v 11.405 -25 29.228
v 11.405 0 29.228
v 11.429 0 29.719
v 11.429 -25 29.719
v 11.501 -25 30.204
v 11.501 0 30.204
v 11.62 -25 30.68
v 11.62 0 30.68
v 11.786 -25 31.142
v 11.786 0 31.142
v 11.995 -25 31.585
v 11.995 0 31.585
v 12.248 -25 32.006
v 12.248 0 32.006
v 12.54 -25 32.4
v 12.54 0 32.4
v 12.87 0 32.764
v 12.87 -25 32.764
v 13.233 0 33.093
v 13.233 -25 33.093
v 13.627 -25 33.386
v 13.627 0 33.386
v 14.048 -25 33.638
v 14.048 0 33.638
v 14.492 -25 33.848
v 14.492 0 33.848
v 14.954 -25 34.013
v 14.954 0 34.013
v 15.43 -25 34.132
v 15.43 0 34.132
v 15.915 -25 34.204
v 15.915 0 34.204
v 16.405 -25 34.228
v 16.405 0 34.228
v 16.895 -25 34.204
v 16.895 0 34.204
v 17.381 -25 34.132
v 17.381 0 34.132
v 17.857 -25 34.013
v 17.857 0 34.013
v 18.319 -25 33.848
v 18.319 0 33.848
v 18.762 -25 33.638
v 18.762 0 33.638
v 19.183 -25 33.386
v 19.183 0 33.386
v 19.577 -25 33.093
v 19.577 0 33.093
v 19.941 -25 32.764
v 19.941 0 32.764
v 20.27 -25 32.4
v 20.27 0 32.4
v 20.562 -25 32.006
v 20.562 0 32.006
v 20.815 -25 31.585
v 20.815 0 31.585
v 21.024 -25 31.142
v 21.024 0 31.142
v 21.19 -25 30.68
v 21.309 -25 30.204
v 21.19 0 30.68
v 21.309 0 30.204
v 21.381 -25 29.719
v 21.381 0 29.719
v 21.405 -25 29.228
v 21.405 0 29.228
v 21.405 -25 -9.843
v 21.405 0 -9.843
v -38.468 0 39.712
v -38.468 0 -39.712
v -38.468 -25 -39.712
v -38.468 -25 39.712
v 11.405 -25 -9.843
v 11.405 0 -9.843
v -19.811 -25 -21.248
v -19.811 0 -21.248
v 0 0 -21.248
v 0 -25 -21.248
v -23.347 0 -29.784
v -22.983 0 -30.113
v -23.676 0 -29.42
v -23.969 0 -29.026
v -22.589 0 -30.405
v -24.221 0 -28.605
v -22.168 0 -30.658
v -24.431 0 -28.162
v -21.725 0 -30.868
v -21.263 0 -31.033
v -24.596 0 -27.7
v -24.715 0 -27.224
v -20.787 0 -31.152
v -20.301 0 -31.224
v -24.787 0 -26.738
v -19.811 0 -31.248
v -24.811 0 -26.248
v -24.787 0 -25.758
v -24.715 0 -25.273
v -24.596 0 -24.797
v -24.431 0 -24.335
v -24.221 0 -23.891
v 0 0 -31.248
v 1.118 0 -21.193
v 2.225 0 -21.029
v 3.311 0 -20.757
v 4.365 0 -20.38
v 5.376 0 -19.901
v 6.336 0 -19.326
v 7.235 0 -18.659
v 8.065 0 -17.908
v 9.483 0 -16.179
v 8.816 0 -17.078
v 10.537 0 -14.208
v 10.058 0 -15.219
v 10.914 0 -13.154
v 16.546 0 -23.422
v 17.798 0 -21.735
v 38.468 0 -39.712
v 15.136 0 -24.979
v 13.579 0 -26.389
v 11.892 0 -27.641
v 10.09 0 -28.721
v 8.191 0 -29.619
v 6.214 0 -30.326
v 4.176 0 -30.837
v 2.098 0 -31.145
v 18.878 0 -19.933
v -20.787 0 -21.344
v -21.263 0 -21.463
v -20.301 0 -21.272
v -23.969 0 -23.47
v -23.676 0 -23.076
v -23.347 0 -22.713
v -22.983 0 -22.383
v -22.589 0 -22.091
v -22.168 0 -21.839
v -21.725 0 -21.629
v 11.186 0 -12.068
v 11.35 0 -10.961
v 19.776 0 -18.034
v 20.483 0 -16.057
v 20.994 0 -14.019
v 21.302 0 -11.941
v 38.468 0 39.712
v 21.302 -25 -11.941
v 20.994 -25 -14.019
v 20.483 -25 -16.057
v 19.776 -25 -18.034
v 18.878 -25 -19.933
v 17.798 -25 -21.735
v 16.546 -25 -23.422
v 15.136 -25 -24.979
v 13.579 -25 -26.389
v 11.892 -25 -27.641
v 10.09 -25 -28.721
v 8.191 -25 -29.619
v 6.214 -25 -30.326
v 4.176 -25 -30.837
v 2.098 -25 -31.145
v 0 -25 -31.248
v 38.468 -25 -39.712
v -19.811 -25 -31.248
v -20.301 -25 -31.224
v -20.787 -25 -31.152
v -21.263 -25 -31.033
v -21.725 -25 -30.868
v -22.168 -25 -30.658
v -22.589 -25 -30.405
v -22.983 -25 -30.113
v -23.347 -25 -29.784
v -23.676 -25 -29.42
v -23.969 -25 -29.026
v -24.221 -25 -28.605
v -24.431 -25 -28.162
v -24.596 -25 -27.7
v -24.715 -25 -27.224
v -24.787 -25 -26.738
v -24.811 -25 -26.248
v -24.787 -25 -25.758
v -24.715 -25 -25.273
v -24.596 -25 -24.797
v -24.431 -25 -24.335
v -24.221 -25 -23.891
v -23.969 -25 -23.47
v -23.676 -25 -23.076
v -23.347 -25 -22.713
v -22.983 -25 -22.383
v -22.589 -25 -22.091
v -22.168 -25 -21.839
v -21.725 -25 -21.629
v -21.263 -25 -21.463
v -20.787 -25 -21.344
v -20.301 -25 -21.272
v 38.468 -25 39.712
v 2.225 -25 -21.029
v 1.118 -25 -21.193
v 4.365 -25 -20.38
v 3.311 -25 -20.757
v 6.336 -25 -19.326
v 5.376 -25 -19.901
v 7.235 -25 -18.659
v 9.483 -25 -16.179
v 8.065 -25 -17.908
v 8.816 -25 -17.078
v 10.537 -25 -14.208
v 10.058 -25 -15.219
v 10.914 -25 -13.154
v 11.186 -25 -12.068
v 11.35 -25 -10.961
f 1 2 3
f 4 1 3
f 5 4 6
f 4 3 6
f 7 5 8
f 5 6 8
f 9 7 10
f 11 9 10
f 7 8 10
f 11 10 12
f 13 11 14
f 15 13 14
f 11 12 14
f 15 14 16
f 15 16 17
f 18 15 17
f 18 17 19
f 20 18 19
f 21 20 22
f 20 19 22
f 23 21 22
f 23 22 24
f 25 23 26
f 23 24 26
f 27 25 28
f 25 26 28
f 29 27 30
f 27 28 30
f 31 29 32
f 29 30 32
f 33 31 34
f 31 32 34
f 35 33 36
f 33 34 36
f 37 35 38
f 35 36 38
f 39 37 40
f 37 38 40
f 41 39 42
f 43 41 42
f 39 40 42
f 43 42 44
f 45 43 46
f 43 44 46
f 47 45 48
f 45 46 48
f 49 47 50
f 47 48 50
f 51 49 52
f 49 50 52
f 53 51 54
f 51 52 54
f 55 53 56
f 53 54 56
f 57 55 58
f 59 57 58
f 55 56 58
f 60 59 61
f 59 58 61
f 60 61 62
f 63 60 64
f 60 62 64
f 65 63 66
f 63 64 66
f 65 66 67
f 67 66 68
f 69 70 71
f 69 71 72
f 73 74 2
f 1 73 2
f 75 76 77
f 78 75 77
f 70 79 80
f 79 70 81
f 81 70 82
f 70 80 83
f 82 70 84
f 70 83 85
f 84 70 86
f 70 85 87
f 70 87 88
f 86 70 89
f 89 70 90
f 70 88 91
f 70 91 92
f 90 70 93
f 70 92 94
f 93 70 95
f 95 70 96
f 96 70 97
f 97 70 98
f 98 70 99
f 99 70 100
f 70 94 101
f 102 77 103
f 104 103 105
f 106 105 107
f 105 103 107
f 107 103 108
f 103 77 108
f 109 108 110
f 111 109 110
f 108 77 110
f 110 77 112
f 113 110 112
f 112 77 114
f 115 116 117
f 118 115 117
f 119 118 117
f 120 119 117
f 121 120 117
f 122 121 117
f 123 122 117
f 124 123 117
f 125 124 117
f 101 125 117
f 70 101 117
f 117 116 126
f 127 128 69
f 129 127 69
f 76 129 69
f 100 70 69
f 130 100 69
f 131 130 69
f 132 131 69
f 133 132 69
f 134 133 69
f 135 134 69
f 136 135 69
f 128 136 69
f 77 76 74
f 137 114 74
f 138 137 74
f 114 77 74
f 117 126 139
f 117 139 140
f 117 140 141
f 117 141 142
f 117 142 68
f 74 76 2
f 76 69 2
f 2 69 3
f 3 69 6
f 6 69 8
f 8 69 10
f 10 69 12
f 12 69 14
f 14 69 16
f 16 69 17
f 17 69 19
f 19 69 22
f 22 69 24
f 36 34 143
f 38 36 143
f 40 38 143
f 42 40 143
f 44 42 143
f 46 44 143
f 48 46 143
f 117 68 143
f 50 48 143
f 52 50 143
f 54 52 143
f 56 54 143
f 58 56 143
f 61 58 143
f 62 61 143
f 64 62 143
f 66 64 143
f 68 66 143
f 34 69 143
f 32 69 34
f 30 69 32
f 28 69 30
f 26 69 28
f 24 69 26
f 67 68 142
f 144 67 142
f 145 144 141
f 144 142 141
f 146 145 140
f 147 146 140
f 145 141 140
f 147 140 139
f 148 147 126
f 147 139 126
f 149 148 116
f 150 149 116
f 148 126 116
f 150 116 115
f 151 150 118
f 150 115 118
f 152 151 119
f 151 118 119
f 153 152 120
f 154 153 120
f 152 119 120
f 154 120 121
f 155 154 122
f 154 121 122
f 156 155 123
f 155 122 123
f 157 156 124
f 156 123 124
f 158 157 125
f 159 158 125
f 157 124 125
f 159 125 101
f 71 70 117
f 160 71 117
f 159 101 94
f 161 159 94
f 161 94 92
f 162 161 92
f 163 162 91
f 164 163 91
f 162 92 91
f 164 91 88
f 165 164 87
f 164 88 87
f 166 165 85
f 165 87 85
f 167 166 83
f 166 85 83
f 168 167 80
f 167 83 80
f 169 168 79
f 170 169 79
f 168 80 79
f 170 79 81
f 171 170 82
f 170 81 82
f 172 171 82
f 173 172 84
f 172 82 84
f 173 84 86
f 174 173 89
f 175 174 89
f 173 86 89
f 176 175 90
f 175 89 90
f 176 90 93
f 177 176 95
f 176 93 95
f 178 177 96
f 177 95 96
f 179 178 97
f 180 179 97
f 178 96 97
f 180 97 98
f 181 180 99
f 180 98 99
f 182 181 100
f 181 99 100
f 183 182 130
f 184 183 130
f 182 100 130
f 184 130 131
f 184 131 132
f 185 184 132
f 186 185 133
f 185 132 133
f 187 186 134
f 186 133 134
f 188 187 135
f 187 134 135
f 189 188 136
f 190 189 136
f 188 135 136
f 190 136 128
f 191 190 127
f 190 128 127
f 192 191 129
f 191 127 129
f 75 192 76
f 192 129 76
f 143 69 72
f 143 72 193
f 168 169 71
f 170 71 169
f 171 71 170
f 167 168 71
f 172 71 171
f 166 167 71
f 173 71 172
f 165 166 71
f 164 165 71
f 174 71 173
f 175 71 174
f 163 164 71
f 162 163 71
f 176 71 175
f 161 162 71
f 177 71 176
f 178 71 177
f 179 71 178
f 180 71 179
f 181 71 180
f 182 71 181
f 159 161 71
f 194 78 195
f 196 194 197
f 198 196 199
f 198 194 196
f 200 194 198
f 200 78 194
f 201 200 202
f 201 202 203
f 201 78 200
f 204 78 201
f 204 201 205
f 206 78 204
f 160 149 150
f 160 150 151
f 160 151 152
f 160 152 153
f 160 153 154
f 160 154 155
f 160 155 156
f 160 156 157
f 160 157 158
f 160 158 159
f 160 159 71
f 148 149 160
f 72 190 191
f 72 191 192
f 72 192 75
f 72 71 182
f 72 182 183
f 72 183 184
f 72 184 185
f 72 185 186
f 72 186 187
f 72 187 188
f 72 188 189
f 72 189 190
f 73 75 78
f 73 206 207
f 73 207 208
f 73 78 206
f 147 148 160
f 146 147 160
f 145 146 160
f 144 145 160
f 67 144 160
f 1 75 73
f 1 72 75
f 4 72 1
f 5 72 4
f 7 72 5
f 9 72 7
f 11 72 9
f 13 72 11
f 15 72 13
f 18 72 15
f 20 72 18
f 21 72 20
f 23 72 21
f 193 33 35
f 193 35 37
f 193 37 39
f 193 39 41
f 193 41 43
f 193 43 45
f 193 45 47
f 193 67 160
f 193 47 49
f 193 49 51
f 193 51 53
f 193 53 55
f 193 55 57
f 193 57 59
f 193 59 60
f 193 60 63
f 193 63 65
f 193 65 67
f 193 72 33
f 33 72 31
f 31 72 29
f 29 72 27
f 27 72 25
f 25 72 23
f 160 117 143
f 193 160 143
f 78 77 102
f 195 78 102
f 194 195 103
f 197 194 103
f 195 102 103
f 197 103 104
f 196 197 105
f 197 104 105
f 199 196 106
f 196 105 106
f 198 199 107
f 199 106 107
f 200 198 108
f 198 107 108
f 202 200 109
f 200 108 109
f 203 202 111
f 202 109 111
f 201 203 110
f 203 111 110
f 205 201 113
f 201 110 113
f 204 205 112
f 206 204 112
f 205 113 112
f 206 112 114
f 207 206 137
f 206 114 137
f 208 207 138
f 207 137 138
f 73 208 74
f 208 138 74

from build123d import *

# Parameters (mm, degrees)
F0_W     = 76.9356526434
F0_H     = 79.423185253
F1_DEPTH = 25


# Not quite as in the source:
# - ends of sketch curves that miss each other by under 0.0002 mm in the source are joined


with BuildPart() as f1:
    # F0 (on Front) → F1 (new body)
    with BuildSketch(Plane.XZ):
        Rectangle(F0_W, F0_H)
        with BuildLine():
            Line((11.4050824274, -9.8430258844), (11.4050824274, 29.2284450168))
            ThreePointArc((11.4050824274, 29.2284450168), (16.4050836887, 34.228446278), (21.4050849499, 29.2284450168))
            Line((21.4050849499, 29.2284450168), (21.4050824274, -9.8430258844))
            ThreePointArc((21.4050824274, -9.8430258844), (15.1356789363, -24.9787048207), (0, -31.2481083118))
            Line((0, -31.2481083118), (-19.8113770242, -31.2481083118))
            ThreePointArc((-19.8113770242, -31.2481083118), (-24.8113770242, -26.2481083118), (-19.8113770242, -21.2481083118))
            Line((-19.8113770242, -21.2481083118), (0, -21.2481083118))
            ThreePointArc((0, -21.2481083118), (8.0646111244, -17.9076370088), (11.4050824274, -9.8430258844))
        make_face(mode=Mode.SUBTRACT)
    extrude(amount=F1_DEPTH)


solid = f1.part
